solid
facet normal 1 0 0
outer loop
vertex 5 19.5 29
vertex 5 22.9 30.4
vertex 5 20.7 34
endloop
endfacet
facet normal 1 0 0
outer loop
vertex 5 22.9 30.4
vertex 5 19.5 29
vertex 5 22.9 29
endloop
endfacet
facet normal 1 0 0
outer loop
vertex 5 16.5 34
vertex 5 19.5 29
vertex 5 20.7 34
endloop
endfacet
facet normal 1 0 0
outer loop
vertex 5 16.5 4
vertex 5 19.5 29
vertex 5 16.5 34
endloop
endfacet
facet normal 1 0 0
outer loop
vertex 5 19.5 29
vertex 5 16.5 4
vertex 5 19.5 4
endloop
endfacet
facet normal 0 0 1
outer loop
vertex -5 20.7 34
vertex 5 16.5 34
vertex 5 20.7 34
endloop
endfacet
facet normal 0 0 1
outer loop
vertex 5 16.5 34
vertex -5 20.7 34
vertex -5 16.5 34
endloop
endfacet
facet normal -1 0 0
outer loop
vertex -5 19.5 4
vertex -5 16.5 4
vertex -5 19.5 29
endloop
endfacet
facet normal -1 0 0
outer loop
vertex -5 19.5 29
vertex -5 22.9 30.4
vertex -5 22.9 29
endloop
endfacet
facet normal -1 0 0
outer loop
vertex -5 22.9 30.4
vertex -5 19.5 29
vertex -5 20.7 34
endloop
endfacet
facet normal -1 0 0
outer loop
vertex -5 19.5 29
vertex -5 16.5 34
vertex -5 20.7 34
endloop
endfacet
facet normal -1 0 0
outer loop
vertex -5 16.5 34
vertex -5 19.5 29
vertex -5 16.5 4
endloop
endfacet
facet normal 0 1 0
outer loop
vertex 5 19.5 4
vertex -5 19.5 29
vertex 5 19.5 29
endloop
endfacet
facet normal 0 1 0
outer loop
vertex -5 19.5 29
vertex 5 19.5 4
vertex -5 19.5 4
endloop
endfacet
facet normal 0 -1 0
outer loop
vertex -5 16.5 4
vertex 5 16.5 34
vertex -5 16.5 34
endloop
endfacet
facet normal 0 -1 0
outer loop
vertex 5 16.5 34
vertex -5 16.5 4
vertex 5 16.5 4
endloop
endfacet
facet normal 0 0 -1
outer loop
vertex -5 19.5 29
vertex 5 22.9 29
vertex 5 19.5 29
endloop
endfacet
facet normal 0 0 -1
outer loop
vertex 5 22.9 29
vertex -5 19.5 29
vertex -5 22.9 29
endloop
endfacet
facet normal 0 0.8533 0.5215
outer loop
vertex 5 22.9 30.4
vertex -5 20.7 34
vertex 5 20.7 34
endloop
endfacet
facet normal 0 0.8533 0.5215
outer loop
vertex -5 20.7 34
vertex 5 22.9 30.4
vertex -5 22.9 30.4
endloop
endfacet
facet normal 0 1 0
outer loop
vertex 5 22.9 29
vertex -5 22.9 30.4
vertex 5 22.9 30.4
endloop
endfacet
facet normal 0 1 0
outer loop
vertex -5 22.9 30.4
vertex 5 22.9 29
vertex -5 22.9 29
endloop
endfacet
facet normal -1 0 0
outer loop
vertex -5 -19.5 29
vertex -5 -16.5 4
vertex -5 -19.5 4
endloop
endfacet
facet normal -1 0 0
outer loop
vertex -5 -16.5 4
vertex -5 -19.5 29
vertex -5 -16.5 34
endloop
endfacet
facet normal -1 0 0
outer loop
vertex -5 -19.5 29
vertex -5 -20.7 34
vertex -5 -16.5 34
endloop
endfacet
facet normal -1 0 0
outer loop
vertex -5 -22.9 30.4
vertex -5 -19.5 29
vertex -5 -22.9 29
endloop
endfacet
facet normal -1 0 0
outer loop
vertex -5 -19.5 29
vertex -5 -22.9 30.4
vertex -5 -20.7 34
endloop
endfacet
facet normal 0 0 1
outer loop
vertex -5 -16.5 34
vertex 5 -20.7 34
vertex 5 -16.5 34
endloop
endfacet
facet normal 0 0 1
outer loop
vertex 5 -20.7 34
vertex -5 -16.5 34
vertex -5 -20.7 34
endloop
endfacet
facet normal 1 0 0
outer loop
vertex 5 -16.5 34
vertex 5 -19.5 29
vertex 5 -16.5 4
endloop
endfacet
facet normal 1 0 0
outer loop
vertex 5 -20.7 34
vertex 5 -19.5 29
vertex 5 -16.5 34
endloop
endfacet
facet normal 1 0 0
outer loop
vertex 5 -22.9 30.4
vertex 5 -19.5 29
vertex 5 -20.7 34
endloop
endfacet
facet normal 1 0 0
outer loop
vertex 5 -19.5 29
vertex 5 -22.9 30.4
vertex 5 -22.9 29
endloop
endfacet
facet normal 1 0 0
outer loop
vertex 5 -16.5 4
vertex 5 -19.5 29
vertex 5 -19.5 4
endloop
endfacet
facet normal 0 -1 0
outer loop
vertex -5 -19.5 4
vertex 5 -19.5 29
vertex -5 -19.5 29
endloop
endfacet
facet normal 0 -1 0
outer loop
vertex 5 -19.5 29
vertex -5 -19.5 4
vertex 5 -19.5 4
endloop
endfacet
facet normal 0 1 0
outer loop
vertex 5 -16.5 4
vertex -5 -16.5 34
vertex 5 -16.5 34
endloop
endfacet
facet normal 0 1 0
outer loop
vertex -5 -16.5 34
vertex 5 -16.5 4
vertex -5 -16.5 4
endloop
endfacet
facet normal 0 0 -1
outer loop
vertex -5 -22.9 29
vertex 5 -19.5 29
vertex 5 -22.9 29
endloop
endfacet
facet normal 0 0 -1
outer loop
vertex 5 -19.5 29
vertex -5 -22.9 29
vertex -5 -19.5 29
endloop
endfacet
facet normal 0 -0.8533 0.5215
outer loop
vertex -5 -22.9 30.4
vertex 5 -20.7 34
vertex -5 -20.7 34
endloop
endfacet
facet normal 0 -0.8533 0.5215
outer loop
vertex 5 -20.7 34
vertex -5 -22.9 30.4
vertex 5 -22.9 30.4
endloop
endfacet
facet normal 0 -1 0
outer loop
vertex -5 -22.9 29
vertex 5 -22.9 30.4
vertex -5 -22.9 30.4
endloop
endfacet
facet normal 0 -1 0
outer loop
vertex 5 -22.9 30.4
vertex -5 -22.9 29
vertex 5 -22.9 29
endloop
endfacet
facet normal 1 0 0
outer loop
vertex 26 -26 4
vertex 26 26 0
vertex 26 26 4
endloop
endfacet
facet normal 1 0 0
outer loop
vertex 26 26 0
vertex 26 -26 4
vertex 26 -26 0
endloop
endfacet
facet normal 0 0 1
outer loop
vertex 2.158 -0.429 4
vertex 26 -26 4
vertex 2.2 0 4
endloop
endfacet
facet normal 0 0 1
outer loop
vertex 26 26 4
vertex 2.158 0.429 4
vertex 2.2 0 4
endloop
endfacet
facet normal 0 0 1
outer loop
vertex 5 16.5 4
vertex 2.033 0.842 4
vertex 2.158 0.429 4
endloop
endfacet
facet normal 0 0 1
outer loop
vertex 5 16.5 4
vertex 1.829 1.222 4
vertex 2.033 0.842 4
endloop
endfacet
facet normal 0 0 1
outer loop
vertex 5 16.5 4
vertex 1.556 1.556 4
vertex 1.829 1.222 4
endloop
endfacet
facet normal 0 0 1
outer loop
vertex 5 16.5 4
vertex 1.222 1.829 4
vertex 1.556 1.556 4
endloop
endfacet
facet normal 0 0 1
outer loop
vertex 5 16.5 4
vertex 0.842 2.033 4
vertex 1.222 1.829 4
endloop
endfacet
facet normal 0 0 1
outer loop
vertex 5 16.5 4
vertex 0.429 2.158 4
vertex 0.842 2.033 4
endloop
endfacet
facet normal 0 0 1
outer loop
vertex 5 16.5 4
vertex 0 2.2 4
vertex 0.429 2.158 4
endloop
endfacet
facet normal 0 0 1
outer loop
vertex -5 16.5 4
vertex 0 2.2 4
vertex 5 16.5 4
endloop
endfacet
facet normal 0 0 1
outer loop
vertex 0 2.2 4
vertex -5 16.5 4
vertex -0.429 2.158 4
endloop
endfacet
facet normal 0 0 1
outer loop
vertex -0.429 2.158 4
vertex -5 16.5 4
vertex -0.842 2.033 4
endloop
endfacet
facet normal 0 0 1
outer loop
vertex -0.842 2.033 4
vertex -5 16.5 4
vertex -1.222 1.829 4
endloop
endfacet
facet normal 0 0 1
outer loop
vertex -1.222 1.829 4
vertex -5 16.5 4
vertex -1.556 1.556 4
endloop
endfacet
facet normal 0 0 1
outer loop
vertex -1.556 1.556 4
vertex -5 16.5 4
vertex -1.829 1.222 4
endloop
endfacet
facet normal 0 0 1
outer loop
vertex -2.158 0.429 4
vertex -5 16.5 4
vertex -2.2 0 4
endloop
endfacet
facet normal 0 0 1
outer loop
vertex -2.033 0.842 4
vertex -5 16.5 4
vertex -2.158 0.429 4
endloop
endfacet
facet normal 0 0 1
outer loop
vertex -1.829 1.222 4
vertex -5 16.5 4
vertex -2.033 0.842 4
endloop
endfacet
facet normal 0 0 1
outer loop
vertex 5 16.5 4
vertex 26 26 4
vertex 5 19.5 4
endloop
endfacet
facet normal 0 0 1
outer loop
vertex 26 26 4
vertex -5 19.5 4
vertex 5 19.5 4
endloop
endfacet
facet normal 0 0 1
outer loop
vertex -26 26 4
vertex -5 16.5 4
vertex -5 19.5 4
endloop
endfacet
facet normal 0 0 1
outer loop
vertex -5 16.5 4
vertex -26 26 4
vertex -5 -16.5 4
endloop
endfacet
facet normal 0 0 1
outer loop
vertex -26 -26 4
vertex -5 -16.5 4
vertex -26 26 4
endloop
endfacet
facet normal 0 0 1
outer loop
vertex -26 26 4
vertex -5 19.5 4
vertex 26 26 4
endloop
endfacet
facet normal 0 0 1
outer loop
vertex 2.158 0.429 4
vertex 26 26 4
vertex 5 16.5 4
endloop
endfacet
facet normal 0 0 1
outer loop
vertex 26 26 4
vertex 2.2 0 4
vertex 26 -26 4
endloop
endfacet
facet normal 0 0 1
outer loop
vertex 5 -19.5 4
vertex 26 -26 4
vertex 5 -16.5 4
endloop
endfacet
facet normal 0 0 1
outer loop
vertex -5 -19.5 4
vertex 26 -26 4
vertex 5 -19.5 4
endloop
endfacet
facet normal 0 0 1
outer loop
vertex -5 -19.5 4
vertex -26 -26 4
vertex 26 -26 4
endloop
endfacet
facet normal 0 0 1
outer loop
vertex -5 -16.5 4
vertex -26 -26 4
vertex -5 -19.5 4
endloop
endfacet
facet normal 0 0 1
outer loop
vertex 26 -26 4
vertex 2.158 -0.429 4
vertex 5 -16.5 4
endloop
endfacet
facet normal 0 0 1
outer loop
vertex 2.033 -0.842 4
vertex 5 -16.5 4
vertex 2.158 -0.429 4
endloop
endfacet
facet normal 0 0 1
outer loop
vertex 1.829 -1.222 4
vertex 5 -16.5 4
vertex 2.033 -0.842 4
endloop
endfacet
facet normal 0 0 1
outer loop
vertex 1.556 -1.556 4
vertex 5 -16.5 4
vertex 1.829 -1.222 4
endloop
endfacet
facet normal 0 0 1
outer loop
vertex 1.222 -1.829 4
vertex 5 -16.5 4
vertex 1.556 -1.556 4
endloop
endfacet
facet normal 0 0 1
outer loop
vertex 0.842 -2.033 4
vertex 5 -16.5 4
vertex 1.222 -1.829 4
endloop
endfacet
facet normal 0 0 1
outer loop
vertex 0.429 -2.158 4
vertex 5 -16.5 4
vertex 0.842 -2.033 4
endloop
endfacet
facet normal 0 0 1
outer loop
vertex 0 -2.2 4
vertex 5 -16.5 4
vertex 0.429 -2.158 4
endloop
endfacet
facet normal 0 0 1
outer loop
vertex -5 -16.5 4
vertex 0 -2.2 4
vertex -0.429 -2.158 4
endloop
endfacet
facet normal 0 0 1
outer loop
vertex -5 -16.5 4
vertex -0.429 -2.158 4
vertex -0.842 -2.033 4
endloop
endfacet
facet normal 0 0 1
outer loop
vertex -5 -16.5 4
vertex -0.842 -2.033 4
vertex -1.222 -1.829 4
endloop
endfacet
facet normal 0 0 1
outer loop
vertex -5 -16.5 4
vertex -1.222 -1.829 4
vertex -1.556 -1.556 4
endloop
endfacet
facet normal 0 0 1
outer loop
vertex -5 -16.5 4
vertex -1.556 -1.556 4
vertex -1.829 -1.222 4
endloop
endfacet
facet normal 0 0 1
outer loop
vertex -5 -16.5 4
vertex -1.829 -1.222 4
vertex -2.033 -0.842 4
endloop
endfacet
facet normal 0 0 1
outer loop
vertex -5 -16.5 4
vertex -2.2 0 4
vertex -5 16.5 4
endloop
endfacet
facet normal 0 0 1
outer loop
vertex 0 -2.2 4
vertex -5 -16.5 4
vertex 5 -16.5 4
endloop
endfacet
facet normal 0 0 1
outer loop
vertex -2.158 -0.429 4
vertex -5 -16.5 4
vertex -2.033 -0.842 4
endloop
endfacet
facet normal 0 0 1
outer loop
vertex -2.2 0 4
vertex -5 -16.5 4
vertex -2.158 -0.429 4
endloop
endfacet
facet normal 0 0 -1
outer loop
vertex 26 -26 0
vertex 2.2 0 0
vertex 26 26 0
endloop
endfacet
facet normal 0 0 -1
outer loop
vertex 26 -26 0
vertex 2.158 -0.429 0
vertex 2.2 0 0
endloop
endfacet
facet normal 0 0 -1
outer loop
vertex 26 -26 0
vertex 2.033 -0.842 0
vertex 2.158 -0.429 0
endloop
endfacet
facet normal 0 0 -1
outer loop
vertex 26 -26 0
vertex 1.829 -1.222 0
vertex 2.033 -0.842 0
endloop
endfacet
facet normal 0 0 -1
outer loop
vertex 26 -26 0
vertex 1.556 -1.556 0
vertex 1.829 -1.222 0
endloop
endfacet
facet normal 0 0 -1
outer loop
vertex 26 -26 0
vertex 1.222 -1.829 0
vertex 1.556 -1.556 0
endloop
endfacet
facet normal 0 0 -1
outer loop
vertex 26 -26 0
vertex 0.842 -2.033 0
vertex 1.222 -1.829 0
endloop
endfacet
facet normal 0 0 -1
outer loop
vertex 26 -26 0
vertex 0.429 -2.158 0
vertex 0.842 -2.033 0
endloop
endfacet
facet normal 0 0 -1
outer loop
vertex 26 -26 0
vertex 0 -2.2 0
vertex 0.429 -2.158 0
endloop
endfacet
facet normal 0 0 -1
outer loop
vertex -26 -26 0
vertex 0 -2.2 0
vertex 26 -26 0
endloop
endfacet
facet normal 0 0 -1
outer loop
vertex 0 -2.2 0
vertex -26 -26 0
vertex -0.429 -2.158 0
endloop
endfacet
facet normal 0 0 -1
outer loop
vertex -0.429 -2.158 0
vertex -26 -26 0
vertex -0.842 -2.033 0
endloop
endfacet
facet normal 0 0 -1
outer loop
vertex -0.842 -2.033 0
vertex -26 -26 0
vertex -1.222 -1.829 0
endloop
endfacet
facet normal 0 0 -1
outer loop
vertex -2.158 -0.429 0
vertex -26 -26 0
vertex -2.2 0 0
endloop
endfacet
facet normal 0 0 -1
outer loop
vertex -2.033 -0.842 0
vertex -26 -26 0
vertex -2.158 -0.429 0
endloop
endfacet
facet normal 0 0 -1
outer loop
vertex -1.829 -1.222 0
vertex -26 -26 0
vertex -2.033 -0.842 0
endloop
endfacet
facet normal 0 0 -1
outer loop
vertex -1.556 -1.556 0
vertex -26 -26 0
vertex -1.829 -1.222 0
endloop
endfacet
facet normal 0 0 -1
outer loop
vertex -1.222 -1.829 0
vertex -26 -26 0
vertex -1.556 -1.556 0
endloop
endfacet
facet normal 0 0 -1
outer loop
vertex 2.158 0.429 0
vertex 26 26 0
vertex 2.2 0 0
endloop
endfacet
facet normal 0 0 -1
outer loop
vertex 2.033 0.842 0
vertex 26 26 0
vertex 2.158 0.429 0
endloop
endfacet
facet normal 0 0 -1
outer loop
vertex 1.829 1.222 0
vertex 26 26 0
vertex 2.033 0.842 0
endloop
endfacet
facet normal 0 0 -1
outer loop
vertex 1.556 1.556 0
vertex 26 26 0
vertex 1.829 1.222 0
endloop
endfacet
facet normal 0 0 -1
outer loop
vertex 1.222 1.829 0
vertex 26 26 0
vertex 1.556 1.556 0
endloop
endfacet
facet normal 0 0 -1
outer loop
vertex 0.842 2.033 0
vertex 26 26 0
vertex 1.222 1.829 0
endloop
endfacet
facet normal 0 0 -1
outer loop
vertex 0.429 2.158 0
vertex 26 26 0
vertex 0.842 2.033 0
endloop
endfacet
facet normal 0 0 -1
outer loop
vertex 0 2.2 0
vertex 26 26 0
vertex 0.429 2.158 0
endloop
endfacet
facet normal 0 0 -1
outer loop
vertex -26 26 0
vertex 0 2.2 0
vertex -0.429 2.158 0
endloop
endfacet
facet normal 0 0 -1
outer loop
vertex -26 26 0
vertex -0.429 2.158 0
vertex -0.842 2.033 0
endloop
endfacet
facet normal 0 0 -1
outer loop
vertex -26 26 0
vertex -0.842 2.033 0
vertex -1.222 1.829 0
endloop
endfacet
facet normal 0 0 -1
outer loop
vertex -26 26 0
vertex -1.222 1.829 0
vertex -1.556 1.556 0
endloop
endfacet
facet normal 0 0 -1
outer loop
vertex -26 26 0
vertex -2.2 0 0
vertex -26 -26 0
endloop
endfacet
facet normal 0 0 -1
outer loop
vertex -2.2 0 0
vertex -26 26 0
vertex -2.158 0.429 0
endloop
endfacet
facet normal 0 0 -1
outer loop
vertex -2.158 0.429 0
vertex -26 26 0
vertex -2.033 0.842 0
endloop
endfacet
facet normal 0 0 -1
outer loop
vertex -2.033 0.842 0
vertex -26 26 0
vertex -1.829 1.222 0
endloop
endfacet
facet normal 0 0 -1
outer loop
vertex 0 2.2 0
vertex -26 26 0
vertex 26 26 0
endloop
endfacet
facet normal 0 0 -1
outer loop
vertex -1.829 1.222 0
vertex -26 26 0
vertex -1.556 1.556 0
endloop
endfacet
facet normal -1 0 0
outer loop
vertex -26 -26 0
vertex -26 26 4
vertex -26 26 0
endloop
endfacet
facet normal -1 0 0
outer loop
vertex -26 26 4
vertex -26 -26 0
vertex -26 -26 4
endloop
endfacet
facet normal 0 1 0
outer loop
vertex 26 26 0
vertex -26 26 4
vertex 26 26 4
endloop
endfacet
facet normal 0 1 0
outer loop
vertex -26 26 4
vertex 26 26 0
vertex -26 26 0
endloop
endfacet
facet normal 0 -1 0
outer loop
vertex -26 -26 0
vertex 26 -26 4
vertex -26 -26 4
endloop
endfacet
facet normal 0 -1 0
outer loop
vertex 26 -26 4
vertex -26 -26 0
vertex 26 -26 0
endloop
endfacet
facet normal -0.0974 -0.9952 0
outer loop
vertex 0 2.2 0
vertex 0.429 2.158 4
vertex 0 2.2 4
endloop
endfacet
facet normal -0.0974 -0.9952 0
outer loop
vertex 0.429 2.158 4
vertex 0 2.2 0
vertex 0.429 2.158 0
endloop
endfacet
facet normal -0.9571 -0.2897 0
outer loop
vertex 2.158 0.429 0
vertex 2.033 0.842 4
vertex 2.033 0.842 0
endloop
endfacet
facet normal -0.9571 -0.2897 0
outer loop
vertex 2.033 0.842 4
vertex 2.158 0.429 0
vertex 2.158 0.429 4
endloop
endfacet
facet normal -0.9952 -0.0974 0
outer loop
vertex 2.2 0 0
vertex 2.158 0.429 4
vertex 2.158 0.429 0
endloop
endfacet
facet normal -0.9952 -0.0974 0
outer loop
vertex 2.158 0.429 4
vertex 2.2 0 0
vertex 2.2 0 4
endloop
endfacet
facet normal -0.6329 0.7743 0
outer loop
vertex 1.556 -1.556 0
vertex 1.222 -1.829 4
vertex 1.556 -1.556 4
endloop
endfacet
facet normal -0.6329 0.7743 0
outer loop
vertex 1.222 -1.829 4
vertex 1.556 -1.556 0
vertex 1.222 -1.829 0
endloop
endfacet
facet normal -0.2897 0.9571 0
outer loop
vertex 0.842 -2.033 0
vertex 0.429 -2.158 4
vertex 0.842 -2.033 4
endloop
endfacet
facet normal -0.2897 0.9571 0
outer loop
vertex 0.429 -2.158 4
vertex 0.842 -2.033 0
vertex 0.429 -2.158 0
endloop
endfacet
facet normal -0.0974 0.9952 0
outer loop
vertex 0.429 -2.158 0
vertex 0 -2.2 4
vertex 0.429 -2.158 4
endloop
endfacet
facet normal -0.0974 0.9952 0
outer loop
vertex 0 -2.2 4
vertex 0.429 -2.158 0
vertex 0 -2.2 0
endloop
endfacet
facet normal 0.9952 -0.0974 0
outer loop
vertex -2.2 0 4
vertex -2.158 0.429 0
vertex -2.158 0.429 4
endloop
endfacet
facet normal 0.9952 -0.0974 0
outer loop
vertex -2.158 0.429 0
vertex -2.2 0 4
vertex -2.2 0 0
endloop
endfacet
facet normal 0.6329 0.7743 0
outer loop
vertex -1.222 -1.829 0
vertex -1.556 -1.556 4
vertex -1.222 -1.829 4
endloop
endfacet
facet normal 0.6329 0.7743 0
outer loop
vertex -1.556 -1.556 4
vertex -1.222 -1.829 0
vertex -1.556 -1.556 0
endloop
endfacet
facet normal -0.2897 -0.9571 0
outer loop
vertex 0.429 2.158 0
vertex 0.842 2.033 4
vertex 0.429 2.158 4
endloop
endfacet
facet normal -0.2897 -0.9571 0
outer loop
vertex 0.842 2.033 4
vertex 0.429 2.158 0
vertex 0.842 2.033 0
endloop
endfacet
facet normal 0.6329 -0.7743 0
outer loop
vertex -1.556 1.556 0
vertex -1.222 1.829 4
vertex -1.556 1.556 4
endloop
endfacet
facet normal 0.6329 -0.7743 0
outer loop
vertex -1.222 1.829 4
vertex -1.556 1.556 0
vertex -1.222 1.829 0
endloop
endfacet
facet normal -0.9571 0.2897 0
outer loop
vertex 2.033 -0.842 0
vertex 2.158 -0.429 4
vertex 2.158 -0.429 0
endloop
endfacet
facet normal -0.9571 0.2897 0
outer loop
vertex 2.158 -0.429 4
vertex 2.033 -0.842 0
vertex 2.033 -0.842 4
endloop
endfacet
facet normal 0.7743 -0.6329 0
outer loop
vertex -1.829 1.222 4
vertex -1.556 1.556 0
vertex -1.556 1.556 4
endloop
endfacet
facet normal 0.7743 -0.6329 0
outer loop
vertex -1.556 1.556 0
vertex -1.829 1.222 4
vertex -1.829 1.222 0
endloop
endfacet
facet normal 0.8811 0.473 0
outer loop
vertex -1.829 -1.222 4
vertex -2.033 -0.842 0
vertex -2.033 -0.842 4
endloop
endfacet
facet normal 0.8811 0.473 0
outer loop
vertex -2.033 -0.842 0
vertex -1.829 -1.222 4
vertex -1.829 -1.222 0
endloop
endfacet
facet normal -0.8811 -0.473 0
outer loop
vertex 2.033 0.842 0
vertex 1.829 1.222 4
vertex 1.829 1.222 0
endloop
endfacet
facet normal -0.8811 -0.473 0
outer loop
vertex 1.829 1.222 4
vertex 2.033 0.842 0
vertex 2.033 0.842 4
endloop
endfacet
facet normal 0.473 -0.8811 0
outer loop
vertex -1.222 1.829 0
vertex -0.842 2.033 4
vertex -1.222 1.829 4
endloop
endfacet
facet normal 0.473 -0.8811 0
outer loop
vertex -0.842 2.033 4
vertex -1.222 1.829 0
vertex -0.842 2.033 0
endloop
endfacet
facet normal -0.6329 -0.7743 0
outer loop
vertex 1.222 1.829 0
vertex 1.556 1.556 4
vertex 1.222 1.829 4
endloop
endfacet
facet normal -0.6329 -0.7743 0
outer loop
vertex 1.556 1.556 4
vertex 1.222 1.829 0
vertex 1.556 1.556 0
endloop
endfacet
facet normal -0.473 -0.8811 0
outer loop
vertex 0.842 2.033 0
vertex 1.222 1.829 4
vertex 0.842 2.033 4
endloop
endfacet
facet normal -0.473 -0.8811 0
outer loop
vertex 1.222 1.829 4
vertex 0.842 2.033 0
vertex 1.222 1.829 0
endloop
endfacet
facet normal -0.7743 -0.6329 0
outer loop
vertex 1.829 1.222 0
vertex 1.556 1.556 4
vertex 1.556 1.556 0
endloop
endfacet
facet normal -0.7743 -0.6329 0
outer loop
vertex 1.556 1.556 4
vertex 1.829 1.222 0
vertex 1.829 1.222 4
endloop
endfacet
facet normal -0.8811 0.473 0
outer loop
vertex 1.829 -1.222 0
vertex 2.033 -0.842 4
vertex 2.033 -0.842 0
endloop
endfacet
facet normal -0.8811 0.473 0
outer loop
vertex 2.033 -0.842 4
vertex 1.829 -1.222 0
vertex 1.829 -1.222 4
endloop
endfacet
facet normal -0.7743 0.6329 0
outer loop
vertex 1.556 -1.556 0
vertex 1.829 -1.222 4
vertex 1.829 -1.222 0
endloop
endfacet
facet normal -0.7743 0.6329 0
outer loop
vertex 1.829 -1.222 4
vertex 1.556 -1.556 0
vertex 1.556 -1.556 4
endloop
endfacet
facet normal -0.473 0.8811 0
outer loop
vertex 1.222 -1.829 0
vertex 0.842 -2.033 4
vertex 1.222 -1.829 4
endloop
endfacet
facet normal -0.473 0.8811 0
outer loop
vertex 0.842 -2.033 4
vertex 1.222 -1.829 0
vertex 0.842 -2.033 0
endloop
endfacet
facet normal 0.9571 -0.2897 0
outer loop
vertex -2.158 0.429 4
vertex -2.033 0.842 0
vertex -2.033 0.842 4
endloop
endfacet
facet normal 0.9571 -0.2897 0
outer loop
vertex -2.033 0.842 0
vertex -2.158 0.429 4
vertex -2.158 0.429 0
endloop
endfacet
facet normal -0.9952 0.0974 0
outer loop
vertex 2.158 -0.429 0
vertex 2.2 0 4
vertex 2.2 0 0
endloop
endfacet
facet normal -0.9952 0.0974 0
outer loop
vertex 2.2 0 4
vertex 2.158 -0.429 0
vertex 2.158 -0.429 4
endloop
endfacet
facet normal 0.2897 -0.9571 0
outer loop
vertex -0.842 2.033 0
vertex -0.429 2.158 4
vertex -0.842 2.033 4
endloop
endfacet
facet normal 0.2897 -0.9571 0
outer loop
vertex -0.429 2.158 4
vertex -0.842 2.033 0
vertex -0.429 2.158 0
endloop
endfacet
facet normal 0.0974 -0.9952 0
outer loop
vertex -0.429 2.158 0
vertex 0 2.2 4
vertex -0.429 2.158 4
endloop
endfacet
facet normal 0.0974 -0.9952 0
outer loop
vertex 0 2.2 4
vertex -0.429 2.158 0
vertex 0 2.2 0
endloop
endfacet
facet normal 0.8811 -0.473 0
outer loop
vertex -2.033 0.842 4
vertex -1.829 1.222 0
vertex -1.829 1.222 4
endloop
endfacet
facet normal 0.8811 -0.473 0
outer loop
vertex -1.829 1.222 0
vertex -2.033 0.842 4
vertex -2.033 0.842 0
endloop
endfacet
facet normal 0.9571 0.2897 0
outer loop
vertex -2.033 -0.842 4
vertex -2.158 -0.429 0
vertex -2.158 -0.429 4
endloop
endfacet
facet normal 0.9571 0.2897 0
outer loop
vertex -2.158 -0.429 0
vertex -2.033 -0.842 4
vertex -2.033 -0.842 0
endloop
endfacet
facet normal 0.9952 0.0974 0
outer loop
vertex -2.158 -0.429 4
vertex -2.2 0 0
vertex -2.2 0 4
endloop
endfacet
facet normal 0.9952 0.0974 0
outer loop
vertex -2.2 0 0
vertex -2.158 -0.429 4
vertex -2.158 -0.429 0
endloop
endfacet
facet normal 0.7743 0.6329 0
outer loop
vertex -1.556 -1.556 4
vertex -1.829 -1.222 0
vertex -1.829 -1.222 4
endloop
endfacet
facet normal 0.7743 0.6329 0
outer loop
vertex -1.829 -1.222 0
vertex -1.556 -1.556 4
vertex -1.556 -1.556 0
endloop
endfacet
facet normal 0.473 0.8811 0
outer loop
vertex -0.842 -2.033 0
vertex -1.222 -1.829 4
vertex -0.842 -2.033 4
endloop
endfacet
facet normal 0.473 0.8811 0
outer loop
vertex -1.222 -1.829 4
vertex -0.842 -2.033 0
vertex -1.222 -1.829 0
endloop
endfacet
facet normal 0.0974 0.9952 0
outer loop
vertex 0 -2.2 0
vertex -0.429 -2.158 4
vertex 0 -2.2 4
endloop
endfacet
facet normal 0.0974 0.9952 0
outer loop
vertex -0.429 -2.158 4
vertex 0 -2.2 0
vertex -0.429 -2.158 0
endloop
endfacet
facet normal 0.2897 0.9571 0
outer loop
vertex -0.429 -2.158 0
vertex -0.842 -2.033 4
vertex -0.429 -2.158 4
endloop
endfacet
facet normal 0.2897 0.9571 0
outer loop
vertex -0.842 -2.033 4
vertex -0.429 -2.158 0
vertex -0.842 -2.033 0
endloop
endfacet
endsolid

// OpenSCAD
$fn = 32;

// ----------------------------------------------------------------------
// Snap-fit latch: 2 arms, 30 mm tall, 3.6 mm undercut hooks
// ----------------------------------------------------------------------

// --- parameters (mm) ---
base_d = 52;              // base plate depth
base_h = 4;               // base plate thickness
span = 36;                // distance between opposite arms
arm_t = 3;                // arm thickness
arm_d = 10;               // arm width
height = 30;              // free arm length
head_len = 3.6;           // hook reach
head_h = 5;               // hook height
lead = 1.4;               // lead-in ramp thickness
bore_d = 4.4;             // base fixing bore
top_z = 34;               // height of the arm tips above the base

arms = 2;

difference() {
  union() {
    /* base plate, centred on the arm ring */
    translate([-26, -26, 0]) cube([base_d, base_d, base_h]);
    for (a = [0 : 360 / arms : 359]) rotate([0, 0, a]) {
    /* arm, sunk 0.5 mm into the base */
    translate([-arm_d / 2, span / 2 - arm_t / 2, base_h - 0.5]) cube([arm_d, arm_t, height + 0.5]);
    /* hook: a convex hull of a tall inner block and a thin outer lip
       gives a flat undercut below and a lead-in ramp on top */
    hull() {
      translate([-arm_d / 2, span / 2 + arm_t / 2 - 0.6, top_z - head_h]) cube([arm_d, lead + 0.4, head_h]);
      translate([-arm_d / 2, span / 2 + arm_t / 2 - 0.2, top_z - head_h]) cube([arm_d, head_len, lead]);
    }
    }
  }
  translate([0, 0, -2.5]) cylinder(h = base_h + 5, d = bore_d);
}
